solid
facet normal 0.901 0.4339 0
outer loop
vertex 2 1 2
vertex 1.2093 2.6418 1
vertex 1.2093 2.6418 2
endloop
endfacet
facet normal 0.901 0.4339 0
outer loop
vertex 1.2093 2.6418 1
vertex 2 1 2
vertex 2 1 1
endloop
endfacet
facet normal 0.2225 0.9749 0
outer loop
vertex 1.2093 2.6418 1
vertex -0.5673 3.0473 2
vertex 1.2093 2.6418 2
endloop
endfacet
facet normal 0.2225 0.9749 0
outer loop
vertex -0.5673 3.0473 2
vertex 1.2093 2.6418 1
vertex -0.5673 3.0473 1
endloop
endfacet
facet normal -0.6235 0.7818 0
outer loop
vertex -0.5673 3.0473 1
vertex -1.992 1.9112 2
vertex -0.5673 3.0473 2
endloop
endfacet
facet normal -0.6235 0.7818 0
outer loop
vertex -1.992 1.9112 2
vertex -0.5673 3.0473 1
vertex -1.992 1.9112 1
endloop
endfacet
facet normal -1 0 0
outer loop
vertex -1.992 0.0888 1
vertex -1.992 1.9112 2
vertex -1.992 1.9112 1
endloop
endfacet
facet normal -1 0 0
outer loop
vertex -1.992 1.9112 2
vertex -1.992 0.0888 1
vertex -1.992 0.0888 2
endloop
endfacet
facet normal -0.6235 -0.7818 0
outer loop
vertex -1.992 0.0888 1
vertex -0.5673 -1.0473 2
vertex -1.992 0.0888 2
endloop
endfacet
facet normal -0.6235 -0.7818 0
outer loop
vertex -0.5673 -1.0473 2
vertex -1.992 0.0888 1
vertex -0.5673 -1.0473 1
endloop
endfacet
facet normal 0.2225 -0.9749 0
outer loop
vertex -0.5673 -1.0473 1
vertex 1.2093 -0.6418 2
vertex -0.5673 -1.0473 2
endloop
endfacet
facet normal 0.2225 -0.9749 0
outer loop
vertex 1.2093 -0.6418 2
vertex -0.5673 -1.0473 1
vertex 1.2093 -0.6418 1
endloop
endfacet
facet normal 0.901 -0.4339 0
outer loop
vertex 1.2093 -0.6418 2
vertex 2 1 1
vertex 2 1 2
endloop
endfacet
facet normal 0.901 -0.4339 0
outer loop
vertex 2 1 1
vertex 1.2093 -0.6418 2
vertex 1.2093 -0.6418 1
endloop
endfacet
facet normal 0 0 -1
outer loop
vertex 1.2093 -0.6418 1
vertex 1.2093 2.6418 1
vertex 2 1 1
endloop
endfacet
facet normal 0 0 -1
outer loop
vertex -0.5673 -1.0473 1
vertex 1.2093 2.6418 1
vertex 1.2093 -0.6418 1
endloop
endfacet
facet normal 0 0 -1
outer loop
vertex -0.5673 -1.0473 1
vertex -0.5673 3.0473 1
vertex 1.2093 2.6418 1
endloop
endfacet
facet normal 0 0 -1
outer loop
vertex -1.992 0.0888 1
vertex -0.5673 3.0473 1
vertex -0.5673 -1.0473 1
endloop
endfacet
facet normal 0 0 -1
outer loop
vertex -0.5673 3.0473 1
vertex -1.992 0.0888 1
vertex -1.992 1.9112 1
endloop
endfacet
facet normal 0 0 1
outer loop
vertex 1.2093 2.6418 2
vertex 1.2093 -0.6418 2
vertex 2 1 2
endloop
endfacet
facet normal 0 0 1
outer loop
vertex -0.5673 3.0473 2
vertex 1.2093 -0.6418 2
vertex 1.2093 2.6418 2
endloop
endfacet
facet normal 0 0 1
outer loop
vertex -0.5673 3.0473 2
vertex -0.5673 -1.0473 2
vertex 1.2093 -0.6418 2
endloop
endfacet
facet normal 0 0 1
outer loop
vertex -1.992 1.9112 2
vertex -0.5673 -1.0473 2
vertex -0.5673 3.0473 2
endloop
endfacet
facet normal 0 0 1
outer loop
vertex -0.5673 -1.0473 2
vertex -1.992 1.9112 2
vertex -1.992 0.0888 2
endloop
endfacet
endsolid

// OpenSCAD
   translate([-0.1,1,1]) color([1,9,4])  cylinder(r=2.1); 

 translate([-1.1,1,1])  color([1,1,1]) polygon( [ [-0.5,0],[-2,4],[1,9],[4,4], [2.5,0] ] , [ [0,1,2,3,4] ]);  
 

 translate([0.1,1,1])  rotate([180,0,0])  color([1,1,1]) polygon( [ [-0.5,0],[-2,4],[1,9],[4,4], [2.5,0] ] , [ [0,1,2,3,4] ]);

 translate([-2.1,1,1])  rotate([180,0,0])  color([1,1,1]) polygon( [ [-0.5,0],[-2,4],[1,9],[4,4], [2.5,0] ] , [ [0,1,2,3,4] ]); ;

 translate([1,0,0]) polygon( [ [-0.5,0],[-2,3],[1,5],[4,3], [2.5,0] ] , [ [0,1,2,3,4] ]); 

 translate([-3,0,0])  polygon( [ [-0.5,0],[-2,3],[1,5],[4,3], [2.5,0] ] , [ [0,1,2,3,4] ]); 

translate([1,-3,0]) polygon( [ [-0.5,0],[-2,3],[1,5],[4,3], [2.5,0] ] , [ [0,1,2,3,4] ]);  

 translate([-3,-3,0]) polygon( [ [-0.5,0],[-2,3],[1,5],[4,3], [2.5,0] ] , [ [0,1,2,3,4] ]); 

 translate([1,-6,0]) polygon( [ [-0.5,0],[-2,3],[1,5],[4,3], [2.5,0] ] , [ [0,1,2,3,4] ]); 

 translate([-3,-6,0]) polygon( [ [-0.5,0],[-2,3],[1,5],[4,3], [2.5,0] ] , [ [0,1,2,3,4] ]); 

 translate([-1,3,0]) polygon( [ [-0.5,0],[-2,3],[1,5],[4,3], [2.5,0] ] , [ [0,1,2,3,4] ]);

 translate([-1,-9,0]) polygon( [ [-0.5,0],[-2,3],[1,5],[4,3], [2.5,0] ] , [ [0,1,2,3,4] ]); 

 translate([-1,-3,2])   polygon( [ [-0.5,0],[-2,3],[1,5],[4,3], [2.5,0] ] , [ [0,1,3,4,2] ]); 

 translate([-1,-4,2])   polygon( [ [-0.5,0],[-2,3],[1,5],[4,3], [2.5,0] ] , [ [0,1,3,4,2] ]); 

 translate([-1,-5,2])   polygon( [ [-0.5,0],[-2,3],[1,5],[4,3], [2.5,0] ] , [ [0,1,3,4,2] ]);
